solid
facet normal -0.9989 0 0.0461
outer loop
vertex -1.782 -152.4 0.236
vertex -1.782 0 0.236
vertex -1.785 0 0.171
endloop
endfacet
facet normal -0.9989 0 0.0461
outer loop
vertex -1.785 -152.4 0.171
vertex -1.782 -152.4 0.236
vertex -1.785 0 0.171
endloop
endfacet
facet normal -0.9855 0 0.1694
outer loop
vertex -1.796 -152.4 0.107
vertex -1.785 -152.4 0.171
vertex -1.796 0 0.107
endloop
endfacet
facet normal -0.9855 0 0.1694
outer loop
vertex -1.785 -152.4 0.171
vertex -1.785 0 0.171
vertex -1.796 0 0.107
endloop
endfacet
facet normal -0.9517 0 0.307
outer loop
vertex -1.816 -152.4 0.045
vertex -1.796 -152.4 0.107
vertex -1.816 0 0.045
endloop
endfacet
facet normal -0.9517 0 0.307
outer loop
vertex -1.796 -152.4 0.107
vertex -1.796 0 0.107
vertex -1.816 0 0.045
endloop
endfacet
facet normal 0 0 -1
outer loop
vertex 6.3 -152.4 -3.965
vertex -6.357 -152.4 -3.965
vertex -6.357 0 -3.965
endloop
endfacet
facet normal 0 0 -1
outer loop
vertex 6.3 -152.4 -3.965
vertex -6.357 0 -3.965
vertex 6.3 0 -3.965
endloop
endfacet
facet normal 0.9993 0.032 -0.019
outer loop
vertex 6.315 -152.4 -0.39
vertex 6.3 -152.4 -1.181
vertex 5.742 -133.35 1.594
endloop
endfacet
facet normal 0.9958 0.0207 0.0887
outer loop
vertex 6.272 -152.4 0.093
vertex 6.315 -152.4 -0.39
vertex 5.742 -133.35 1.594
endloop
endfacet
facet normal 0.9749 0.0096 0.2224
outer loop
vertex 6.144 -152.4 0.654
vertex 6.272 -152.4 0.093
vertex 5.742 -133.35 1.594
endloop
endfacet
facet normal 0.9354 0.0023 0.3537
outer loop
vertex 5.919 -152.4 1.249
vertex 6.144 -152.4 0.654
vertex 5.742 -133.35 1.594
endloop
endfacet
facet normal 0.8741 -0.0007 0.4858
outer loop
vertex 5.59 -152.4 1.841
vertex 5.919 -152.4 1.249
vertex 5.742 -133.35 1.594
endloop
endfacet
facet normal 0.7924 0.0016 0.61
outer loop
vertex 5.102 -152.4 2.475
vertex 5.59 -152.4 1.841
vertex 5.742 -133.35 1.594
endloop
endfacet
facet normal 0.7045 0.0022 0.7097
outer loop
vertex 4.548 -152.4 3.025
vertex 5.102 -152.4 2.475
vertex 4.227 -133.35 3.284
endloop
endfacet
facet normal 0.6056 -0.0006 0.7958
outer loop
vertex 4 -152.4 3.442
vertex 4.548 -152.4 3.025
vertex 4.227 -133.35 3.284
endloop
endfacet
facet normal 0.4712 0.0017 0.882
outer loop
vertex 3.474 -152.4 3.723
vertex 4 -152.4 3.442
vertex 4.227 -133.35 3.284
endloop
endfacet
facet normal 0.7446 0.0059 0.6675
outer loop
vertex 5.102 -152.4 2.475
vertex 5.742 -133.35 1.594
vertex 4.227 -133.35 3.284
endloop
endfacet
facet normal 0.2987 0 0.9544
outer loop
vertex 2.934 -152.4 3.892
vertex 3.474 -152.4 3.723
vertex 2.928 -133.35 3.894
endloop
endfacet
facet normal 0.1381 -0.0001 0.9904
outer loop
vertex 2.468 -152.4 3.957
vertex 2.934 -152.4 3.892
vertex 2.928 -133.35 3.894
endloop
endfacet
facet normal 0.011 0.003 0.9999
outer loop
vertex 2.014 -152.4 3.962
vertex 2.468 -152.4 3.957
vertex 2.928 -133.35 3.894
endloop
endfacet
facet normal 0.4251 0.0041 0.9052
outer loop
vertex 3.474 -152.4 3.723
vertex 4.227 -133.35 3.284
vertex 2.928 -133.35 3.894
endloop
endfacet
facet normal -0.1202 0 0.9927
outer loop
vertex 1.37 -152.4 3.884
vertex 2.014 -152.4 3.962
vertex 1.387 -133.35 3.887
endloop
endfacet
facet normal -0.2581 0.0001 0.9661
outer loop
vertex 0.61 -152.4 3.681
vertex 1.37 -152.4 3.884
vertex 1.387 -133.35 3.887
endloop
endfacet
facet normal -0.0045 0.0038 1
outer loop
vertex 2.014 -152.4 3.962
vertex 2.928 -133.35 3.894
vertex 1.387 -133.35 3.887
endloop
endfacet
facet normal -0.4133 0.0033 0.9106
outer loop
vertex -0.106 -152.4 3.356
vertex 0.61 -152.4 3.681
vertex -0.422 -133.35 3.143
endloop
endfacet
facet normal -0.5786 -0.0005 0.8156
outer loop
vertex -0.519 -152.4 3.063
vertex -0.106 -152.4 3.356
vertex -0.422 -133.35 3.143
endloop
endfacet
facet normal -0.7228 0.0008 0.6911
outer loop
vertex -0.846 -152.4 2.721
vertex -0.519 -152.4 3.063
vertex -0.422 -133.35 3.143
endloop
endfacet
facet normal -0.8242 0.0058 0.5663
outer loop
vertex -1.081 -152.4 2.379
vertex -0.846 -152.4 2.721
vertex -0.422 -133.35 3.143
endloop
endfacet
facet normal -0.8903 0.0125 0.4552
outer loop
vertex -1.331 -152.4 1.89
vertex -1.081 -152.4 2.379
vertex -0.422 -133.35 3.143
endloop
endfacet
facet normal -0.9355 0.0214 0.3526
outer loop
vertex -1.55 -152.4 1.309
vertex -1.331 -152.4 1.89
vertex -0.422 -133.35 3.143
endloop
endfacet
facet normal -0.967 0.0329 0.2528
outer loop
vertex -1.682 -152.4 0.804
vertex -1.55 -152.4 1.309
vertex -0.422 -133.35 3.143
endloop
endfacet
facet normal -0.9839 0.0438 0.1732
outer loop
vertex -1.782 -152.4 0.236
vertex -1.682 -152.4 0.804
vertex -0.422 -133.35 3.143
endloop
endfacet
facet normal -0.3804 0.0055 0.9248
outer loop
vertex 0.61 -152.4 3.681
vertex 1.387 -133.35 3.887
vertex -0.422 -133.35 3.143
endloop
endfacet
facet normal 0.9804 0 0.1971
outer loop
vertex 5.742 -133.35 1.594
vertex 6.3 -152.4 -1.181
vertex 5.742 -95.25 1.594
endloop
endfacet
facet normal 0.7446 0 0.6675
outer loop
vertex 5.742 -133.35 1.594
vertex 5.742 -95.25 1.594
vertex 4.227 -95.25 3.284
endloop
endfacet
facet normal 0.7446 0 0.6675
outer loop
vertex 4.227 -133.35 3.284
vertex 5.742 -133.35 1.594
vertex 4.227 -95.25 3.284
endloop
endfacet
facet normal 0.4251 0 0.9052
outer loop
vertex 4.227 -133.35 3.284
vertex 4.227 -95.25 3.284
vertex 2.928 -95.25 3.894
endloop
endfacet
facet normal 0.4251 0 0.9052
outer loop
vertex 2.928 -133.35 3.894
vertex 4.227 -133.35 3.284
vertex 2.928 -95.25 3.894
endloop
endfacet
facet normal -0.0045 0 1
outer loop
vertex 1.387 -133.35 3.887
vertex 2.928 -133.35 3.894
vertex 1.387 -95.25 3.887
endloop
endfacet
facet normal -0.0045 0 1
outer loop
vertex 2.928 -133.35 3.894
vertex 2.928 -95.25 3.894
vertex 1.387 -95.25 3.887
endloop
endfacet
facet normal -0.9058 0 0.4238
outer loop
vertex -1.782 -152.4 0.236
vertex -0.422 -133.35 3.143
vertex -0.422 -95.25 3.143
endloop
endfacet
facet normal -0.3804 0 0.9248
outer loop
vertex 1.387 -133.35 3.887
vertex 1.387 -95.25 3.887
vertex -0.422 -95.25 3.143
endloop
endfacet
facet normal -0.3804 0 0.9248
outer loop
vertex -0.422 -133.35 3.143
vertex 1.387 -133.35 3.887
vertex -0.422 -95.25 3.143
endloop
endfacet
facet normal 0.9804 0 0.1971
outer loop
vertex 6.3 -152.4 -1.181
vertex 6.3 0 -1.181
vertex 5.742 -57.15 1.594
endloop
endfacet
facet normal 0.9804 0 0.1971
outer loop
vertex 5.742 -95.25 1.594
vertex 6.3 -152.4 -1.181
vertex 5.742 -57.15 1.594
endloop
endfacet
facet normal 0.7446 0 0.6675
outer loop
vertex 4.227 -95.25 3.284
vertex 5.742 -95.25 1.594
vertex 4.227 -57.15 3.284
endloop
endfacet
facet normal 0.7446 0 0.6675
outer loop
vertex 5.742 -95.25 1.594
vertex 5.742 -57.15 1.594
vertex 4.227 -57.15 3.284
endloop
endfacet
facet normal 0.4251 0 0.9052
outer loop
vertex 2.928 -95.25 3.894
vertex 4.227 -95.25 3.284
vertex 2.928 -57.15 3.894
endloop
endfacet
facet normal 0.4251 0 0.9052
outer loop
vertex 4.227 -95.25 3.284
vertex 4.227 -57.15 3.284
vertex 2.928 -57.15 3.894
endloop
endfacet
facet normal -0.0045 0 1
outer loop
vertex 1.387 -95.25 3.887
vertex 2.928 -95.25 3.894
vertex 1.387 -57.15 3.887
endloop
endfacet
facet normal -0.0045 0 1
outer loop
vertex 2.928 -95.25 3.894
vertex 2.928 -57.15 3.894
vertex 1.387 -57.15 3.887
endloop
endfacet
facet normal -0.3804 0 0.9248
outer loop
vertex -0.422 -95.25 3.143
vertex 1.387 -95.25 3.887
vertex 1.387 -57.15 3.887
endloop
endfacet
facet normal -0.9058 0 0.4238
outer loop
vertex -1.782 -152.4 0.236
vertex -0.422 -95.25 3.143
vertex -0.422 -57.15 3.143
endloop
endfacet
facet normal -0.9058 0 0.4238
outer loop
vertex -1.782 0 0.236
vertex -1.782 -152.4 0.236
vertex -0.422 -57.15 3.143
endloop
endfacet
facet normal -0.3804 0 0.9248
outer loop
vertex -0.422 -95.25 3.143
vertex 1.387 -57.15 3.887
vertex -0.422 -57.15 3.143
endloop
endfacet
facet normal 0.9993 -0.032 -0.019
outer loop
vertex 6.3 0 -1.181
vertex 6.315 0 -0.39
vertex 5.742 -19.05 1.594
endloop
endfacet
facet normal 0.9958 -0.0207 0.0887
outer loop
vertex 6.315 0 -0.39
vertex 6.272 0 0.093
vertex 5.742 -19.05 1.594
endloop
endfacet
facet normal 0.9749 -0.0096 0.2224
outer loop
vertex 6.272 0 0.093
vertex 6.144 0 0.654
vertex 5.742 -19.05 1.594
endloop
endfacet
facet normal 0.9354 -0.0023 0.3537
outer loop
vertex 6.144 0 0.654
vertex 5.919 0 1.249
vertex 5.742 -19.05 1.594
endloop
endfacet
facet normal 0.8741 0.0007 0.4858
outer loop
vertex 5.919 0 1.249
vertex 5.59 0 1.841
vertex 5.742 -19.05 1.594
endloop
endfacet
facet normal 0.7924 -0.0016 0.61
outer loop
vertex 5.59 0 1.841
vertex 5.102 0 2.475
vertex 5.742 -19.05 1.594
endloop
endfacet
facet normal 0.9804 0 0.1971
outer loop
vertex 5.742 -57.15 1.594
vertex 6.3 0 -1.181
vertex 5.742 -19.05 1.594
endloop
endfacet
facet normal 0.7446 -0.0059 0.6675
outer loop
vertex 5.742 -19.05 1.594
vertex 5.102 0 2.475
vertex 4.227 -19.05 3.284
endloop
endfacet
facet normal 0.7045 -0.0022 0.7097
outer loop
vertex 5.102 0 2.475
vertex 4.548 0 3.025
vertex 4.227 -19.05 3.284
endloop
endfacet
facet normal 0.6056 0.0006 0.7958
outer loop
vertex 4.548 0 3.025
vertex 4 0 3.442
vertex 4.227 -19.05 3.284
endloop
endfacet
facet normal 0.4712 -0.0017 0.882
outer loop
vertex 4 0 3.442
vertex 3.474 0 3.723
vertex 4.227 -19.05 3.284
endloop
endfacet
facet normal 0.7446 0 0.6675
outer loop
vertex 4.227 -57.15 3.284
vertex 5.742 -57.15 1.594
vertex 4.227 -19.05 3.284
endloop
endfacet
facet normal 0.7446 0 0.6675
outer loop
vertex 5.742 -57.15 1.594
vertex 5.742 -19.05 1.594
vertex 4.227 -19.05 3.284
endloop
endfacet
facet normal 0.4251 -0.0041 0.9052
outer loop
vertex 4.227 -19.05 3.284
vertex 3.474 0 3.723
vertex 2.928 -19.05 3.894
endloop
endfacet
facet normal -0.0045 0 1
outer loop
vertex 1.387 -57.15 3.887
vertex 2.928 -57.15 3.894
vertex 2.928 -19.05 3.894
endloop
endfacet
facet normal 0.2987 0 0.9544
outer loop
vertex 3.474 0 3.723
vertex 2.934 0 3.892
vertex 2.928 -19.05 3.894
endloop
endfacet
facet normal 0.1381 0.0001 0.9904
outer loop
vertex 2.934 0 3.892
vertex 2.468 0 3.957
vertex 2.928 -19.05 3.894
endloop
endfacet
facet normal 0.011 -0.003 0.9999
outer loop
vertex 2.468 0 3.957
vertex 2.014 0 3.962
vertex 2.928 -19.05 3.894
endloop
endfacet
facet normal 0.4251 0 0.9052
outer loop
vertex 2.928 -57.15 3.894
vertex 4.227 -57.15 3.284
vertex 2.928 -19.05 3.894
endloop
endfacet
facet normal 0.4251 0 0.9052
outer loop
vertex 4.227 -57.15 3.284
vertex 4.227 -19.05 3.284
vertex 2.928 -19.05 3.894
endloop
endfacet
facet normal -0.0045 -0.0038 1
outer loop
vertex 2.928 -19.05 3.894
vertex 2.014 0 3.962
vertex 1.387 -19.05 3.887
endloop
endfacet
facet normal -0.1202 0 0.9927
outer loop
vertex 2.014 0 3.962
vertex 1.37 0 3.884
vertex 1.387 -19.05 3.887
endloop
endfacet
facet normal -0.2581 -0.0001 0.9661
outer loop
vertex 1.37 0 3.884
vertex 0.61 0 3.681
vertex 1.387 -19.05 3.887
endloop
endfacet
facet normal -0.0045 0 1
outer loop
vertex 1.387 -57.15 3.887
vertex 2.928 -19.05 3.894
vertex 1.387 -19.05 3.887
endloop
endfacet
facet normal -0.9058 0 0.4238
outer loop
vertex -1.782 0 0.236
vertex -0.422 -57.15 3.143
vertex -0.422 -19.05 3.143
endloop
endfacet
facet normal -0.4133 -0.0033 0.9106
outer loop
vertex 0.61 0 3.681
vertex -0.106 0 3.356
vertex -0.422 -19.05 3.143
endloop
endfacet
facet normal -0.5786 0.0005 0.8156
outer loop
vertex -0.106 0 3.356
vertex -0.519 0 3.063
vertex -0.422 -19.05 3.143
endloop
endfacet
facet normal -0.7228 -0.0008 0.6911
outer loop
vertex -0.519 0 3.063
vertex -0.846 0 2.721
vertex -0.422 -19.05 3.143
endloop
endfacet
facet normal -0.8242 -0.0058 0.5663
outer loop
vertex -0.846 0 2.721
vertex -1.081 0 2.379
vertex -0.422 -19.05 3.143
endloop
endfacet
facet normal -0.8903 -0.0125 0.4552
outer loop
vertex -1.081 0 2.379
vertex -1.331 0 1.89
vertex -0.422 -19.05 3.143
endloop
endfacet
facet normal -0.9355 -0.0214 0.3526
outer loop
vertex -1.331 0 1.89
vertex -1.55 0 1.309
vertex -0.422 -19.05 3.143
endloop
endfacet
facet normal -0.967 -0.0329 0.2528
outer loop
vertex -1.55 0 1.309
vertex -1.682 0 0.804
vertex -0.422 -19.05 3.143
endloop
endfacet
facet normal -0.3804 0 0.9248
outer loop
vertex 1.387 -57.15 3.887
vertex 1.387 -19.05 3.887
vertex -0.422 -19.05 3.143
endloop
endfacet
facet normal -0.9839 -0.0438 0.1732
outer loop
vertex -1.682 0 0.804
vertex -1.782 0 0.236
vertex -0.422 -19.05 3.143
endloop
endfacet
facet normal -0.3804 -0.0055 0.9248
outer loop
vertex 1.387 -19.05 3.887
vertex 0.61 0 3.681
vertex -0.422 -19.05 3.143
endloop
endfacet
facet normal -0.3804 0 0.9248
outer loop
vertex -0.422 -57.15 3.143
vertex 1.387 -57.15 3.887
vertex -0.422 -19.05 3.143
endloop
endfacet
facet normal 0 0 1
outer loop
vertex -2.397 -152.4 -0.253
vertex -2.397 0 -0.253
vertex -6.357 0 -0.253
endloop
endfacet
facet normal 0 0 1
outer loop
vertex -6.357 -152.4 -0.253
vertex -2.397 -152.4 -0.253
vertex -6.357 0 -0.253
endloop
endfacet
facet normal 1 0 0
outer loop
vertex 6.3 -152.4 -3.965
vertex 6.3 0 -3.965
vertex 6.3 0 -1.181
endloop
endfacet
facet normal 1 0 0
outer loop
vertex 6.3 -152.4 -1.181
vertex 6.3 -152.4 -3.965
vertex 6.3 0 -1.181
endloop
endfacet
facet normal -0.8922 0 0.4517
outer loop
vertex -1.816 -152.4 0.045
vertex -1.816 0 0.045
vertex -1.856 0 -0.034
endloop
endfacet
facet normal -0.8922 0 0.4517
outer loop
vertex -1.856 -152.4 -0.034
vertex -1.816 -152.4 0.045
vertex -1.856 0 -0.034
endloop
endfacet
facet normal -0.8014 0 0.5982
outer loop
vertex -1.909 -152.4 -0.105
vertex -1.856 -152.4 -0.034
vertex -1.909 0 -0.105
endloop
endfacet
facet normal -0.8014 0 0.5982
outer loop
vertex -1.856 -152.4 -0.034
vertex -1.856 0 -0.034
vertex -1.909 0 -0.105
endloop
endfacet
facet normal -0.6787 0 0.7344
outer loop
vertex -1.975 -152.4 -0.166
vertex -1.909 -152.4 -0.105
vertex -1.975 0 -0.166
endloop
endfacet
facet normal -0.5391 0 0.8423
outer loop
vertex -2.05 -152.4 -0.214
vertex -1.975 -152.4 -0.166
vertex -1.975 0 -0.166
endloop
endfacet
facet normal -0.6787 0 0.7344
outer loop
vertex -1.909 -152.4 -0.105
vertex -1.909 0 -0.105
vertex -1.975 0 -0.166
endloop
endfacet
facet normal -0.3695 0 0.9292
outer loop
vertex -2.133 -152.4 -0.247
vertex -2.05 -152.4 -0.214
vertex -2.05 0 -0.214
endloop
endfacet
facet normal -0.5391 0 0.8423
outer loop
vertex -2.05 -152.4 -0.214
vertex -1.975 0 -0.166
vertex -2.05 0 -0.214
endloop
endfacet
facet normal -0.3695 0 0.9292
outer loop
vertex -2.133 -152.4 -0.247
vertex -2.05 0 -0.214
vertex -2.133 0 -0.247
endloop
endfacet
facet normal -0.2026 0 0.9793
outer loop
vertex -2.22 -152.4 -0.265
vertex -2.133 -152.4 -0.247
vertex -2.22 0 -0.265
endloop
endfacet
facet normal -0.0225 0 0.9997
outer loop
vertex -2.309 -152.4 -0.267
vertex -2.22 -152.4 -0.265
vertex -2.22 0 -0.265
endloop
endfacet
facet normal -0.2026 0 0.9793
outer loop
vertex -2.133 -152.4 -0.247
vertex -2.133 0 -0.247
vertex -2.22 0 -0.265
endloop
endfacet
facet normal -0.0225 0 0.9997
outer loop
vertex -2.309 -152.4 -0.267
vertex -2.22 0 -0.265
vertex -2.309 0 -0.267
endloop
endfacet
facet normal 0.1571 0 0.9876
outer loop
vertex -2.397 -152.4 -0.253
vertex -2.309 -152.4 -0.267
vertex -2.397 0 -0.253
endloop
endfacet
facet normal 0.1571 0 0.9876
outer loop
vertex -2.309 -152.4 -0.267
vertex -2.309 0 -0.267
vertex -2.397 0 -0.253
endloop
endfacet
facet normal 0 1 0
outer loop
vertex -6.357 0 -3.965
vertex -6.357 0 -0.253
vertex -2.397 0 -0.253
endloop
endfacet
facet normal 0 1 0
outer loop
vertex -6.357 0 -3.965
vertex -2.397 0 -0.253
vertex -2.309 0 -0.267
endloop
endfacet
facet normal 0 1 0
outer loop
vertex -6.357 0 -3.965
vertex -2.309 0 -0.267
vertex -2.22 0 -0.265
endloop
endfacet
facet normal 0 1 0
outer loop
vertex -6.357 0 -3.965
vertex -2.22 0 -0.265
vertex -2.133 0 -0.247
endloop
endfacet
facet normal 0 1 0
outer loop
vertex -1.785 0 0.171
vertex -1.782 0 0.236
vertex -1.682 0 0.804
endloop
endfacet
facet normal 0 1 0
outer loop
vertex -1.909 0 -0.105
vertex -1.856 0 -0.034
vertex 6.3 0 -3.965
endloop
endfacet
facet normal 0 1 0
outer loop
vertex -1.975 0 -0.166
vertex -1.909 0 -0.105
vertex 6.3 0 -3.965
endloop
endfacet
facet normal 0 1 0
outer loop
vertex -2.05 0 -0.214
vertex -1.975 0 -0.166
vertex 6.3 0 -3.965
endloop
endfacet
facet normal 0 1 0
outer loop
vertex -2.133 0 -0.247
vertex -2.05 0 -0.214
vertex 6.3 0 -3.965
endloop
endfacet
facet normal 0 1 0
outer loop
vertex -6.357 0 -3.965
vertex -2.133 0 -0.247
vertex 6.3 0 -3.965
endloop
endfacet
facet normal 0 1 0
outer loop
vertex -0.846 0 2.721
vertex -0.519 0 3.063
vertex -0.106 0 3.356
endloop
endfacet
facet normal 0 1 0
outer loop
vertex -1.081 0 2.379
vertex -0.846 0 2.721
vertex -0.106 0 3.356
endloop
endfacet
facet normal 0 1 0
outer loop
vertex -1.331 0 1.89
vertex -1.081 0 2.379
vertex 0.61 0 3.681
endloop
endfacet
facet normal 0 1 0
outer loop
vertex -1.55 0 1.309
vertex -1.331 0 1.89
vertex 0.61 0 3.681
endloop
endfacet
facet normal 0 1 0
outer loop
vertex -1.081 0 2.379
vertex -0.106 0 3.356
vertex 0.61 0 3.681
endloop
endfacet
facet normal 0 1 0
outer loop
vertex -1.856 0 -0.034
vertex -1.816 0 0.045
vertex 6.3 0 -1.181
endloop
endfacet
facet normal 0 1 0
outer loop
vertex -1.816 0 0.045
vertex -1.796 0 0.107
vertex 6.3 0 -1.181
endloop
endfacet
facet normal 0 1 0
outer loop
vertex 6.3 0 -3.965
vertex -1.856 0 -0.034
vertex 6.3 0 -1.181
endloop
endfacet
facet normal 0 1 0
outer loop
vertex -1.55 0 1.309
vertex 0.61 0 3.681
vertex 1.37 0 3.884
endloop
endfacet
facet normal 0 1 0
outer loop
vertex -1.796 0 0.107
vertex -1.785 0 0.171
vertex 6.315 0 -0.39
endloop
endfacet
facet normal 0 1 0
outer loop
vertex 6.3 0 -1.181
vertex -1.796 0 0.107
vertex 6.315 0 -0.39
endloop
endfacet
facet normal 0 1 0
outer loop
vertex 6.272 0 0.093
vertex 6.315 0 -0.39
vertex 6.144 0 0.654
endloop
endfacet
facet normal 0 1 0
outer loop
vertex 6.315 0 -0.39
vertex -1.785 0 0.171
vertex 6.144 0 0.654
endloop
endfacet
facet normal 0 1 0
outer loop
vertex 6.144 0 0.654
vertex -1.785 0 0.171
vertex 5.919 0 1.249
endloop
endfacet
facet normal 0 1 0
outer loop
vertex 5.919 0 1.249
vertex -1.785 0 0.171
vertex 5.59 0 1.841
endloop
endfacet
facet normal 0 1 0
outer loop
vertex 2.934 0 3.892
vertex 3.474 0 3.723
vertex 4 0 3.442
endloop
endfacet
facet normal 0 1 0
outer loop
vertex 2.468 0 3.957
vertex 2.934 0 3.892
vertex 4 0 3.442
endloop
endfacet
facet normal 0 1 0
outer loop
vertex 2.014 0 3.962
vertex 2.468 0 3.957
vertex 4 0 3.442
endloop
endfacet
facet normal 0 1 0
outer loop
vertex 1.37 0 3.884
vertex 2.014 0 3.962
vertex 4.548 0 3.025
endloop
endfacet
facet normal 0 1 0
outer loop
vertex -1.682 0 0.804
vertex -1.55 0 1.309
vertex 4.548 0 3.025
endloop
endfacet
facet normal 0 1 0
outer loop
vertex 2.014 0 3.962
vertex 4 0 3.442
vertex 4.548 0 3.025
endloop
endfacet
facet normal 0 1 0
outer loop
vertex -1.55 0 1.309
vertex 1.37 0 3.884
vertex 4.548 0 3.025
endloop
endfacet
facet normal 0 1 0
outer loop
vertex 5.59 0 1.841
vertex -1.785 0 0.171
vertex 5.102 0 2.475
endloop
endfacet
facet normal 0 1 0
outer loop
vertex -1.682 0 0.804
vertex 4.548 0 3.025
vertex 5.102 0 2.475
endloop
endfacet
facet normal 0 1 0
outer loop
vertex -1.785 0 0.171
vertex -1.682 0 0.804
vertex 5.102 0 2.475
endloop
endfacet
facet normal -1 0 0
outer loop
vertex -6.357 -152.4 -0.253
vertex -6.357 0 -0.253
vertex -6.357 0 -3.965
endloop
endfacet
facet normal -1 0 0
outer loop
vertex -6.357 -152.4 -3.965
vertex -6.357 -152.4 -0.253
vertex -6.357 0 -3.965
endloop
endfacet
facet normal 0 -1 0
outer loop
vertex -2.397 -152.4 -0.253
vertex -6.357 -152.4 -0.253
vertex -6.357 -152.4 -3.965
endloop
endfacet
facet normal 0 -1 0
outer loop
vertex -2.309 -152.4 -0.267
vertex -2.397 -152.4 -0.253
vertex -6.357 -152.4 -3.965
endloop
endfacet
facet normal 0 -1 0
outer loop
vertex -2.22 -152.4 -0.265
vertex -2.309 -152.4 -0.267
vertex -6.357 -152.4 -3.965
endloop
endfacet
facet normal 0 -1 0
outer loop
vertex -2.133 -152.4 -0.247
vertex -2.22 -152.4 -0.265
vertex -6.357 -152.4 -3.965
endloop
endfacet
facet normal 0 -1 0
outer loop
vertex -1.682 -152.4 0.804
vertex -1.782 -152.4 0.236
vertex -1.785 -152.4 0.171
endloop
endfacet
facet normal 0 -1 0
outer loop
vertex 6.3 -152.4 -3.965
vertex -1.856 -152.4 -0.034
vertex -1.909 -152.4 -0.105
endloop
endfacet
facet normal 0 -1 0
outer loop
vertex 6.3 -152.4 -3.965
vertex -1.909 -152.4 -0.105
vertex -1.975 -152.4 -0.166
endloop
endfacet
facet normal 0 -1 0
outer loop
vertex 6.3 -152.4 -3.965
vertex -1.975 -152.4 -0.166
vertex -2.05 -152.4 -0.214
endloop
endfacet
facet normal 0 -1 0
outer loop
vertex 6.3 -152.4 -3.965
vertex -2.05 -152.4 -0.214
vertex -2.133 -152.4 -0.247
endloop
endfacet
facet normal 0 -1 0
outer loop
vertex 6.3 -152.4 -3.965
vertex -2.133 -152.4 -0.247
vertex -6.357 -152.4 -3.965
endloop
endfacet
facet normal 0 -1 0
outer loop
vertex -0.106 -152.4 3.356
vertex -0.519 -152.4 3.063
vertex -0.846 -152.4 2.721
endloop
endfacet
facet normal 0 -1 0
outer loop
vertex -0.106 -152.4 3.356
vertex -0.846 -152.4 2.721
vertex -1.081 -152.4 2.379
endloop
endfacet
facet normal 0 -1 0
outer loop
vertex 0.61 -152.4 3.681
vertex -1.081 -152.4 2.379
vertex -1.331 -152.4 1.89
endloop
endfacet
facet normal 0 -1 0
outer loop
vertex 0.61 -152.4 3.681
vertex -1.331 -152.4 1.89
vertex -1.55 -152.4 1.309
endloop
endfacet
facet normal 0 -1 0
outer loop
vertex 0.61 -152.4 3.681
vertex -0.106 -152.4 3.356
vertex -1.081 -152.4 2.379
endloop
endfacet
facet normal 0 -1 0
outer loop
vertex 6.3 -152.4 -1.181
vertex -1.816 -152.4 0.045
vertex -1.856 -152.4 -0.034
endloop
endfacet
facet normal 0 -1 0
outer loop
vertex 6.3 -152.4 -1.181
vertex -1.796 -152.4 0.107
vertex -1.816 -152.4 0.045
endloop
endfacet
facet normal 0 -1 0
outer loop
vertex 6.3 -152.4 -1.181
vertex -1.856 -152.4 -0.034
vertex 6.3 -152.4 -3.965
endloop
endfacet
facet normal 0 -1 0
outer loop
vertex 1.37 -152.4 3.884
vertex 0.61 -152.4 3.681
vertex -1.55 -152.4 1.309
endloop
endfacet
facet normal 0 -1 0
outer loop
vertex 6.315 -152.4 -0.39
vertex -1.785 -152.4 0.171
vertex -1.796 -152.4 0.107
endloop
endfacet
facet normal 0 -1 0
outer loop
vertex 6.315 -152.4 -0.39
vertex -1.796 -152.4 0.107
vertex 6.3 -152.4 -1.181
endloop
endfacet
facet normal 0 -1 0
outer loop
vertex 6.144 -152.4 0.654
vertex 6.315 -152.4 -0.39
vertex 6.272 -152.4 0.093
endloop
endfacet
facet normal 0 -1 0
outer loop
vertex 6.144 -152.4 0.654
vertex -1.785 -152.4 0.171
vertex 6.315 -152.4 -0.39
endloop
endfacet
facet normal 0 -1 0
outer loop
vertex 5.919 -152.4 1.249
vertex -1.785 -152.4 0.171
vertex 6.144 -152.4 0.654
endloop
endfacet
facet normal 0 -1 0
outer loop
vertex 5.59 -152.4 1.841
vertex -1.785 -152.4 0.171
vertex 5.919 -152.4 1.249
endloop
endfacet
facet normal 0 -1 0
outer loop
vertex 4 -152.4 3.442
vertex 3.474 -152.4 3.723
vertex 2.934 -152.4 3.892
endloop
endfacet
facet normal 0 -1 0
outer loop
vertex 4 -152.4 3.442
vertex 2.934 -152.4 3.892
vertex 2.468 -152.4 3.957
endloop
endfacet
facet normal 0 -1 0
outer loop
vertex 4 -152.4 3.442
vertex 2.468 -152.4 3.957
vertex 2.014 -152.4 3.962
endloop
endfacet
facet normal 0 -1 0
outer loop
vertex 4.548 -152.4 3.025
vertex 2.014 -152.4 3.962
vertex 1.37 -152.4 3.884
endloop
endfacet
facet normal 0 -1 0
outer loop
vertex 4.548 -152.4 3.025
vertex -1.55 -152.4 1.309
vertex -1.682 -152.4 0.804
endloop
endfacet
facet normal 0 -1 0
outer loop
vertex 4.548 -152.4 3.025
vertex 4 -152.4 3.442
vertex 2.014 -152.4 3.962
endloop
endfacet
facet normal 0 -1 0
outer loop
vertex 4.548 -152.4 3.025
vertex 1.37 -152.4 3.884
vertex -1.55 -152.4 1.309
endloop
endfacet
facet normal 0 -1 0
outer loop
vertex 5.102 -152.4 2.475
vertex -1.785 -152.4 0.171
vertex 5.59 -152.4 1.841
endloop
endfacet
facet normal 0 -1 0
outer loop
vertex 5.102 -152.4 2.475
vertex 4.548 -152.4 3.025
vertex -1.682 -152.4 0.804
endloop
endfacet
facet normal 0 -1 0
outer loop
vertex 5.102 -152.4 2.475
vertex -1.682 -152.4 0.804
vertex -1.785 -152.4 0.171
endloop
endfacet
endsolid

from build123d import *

# Parameters (mm, degrees)
F1_DEPTH = 152.4


with BuildPart() as f1:
    # F0 (on Front) → F1 (new body)
    with BuildSketch(Plane.XZ):
        with BuildLine():
            ThreePointArc((-1.8159553651, 0.0454885831), (-2.0502039359, -0.2136246517), (-2.3972405886, -0.2533439547))
            Line((-2.3972405886, -0.2533439547), (-6.3574607484, -0.2533439547))
            Line((-6.3574607484, -0.2533439547), (-6.3574607484, -3.9647636004))
            Line((-6.3574607484, -3.9647636004), (6.2996735796, -3.9647636004))
            Line((6.2996735796, -3.9647636004), (6.2996735796, -1.1812573066))
            add(Edge.make_bspline(
                [(6.2996735796, -1.1812573066), (6.2996735796, -0.814759681), (6.383817909, -0.1032583156), (5.8866193863, 1.7049336943), (4.3086443465, 3.3691325781), (2.9536462115, 3.994528087), (1.3703178854, 3.9887822811), (-0.5488630221, 3.3044199207), (-1.4019577576, 1.9008299974), (-1.6895780573, 0.9041722515), (-1.7818296328, 0.2357061021)],
                knots=[0, 0, 0, 0, 0.1001275599, 0.2310061584, 0.3776694675, 0.4943349448, 0.6152039541, 0.7513752307, 0.8717565674, 1, 1, 1, 1], degree=3))
            ThreePointArc((-1.7818296328, 0.2357061021), (-1.789511711, 0.1389143942), (-1.8159553651, 0.0454885831))
        make_face()
    extrude(amount=F1_DEPTH)


solid = f1.part
